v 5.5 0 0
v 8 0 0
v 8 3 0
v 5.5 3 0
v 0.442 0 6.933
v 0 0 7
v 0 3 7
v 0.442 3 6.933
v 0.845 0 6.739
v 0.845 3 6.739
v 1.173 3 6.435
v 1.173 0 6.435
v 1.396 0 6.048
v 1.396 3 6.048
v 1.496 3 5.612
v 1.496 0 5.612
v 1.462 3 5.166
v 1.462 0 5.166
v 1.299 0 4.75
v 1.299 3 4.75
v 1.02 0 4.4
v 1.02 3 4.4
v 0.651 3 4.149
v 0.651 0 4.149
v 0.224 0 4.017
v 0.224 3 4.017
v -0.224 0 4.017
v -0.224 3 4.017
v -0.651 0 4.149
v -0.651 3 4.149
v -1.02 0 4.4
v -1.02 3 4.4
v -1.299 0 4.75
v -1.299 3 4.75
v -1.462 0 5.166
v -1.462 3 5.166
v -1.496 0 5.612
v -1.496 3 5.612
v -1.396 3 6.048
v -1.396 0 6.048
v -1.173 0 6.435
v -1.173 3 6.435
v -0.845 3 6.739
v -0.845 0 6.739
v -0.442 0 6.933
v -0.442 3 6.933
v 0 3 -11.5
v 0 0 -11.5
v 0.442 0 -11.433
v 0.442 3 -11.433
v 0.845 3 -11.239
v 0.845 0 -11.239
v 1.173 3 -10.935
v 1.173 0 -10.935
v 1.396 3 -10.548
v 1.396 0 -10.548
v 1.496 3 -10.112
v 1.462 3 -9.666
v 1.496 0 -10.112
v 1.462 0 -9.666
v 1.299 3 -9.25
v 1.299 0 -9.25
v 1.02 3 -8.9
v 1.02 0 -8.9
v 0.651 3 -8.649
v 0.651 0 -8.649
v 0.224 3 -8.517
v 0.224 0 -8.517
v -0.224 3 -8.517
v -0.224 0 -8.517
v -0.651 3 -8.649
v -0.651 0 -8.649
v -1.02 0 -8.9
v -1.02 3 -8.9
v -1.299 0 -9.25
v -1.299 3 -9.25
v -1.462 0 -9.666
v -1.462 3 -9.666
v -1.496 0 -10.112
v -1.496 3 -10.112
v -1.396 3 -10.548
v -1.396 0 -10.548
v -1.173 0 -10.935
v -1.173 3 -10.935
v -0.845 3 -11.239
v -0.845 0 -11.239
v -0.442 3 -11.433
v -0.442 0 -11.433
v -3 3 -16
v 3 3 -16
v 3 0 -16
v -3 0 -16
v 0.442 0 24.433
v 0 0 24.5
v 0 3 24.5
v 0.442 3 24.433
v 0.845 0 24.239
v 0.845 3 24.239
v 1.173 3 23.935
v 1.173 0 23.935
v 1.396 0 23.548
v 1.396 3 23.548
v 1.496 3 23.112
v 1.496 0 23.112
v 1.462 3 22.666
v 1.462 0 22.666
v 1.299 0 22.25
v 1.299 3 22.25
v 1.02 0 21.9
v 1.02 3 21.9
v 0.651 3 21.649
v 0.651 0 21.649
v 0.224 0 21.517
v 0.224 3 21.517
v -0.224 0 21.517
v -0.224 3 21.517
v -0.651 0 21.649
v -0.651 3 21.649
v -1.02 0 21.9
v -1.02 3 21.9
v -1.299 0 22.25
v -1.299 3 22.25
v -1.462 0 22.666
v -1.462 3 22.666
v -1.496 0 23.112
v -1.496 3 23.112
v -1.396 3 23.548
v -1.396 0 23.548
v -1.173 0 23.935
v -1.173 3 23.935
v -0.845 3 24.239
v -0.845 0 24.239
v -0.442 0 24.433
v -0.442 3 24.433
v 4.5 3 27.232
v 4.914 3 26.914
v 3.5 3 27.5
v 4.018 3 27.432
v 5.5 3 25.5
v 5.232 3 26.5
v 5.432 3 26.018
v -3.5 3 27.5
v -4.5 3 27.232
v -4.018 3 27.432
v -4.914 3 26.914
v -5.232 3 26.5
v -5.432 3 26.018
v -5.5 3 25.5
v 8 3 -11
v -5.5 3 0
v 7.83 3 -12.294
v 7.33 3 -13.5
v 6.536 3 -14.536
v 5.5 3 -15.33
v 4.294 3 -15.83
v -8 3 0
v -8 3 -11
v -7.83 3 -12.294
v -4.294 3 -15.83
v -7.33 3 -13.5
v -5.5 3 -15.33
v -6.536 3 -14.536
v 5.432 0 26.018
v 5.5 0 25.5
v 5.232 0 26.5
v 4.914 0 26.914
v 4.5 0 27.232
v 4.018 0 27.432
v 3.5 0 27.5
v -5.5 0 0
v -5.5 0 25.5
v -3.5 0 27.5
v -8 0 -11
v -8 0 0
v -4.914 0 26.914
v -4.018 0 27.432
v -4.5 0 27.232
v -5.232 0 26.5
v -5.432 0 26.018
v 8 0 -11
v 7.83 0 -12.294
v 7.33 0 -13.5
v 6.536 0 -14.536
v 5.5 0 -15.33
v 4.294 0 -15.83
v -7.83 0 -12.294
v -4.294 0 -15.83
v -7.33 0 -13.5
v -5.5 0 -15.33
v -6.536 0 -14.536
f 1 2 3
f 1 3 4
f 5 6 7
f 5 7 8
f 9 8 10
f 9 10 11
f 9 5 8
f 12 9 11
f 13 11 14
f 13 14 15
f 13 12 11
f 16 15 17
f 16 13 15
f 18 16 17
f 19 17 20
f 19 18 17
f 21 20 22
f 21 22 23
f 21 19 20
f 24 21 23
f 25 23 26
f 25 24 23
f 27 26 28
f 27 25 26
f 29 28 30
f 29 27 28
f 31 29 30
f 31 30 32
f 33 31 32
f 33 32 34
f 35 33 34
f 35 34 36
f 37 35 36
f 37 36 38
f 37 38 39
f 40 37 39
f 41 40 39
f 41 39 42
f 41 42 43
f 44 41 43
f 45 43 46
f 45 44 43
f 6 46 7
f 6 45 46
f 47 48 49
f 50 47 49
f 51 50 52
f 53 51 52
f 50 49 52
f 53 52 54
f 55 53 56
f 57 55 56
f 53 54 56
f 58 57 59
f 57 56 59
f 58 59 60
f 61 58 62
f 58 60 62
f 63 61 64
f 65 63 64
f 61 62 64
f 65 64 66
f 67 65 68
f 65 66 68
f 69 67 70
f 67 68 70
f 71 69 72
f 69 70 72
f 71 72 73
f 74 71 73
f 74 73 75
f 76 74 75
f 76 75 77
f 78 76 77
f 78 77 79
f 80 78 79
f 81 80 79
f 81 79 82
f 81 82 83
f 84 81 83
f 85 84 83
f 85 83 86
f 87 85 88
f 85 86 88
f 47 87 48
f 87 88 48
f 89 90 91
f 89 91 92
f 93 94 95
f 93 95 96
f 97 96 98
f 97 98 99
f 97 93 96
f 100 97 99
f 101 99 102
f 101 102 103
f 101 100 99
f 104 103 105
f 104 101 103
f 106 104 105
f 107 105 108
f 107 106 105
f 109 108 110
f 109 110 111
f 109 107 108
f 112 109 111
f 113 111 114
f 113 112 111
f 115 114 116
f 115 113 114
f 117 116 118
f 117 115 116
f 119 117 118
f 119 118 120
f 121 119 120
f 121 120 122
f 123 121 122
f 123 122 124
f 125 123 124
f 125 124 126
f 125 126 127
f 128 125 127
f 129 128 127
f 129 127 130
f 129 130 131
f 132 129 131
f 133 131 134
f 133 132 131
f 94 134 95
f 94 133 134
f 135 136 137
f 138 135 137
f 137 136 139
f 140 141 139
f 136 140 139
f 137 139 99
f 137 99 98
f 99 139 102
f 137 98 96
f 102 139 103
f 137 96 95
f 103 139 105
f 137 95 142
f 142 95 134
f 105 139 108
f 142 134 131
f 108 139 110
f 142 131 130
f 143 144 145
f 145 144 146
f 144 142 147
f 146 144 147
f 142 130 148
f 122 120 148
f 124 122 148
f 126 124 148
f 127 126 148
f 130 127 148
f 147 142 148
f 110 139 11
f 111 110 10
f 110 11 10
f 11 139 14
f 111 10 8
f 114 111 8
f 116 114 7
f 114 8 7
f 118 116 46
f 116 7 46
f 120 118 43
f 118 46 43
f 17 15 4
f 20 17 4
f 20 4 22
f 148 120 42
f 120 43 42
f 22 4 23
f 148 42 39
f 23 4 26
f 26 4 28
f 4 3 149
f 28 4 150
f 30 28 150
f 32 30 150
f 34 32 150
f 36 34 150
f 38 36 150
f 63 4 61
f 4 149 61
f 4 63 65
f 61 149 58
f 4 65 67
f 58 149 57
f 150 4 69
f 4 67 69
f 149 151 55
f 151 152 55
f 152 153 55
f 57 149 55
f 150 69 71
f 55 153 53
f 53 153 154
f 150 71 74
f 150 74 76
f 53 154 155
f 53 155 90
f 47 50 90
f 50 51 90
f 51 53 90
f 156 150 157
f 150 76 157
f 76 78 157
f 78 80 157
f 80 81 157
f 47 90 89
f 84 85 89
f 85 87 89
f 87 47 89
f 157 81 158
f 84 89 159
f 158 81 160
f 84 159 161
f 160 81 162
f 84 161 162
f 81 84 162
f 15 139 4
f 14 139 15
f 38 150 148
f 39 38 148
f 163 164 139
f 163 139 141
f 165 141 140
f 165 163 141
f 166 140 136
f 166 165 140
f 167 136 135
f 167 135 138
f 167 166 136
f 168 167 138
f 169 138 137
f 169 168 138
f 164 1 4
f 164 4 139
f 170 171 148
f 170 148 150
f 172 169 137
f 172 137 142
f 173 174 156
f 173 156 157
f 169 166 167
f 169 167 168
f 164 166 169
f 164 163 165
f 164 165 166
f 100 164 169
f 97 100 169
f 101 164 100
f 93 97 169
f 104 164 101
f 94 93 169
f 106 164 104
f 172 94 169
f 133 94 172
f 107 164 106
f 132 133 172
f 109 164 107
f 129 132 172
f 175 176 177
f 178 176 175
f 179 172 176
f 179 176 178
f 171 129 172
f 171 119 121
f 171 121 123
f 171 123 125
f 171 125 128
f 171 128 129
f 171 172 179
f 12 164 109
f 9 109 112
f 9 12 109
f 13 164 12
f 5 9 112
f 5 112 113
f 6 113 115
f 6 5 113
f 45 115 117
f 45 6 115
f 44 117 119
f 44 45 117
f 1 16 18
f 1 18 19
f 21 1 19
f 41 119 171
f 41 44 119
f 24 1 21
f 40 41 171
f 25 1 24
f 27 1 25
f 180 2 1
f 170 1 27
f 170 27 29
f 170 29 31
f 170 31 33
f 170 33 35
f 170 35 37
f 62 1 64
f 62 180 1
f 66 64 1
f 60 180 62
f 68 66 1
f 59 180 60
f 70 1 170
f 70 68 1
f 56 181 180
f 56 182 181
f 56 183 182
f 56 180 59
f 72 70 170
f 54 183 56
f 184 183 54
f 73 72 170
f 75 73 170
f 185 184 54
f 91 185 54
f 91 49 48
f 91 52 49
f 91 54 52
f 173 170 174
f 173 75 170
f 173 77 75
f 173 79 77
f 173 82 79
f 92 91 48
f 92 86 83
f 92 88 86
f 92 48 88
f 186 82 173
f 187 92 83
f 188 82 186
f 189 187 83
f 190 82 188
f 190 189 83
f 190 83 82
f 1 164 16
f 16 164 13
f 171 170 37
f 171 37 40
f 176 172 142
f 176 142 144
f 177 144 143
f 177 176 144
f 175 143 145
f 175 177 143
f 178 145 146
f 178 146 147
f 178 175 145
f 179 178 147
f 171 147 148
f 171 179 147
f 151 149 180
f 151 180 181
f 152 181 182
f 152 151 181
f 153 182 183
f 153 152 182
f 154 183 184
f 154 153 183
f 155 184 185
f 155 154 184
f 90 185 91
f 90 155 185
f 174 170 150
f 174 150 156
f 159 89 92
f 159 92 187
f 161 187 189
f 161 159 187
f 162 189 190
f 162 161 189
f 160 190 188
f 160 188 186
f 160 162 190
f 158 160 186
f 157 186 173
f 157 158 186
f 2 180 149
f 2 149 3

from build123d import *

# Parameters (mm, degrees)
SKETCH3_R           = 1.5
BOSS_EXTRUDE1_DEPTH = 3
BOSS_EXTRUDE2_DEPTH = 3
SKETCH5_R           = 1.5
CUT_EXTRUDE1_DEPTH  = 3


with BuildPart() as part:
    # Sketch3 → Boss-Extrude1 (new body)
    # profile 1 of 2: a face of its own
    with BuildSketch(Plane(origin=(0, 0, 0), x_dir=(1, 0, 0), z_dir=(0, 1, 0))):
        with BuildLine():
            Line((-6, 5), (6, 5))
            ThreePointArc((6, 5), (7.414213562, 4.414213562), (8, 3))
            Line((8, 3), (8, 0))
            Line((8, 0), (-8, 0))
            Line((-8, 0), (-8, 3))
            ThreePointArc((-8, 3), (-7.414213562, 4.414213562), (-6, 5))
        make_face()
    # profile 2 of 2: a face of its own
    with BuildSketch(Plane(origin=(0, 0, 0), x_dir=(1, 0, 0), z_dir=(0, 1, 0))):
        with BuildLine():
            Line((-5.5, 0), (5.5, 0))
            Line((5.5, 0), (5.5, -25.5))
            ThreePointArc((5.5, -25.5), (4.914213562, -26.914213562), (3.5, -27.5))
            Line((3.5, -27.5), (-3.5, -27.5))
            ThreePointArc((-3.5, -27.5), (-4.914213562, -26.914213562), (-5.5, -25.5))
            Line((-5.5, -25.5), (-5.5, 0))
        make_face()
        with Locations(Location((0, -5.5, 0), (0, 0, 270))):
            Circle(SKETCH3_R, mode=Mode.SUBTRACT)
        with Locations(Location((0, -23, 0), (0, 0, 270))):
            Circle(SKETCH3_R, mode=Mode.SUBTRACT)
    extrude(amount=BOSS_EXTRUDE1_DEPTH)

    # Sketch4 → Boss-Extrude2 (add)
    with BuildSketch(Plane(origin=(0, 3, 0), x_dir=(1, 0, 0), z_dir=(0, 1, 0))):
        with BuildLine():
            Line((-8, 0), (8, 0))
            Line((8, 0), (8, 11))
            ThreePointArc((8, 11), (6.535533906, 14.535533906), (3, 16))
            Line((3, 16), (-3, 16))
            ThreePointArc((-3, 16), (-6.535533906, 14.535533906), (-8, 11))
            Line((-8, 11), (-8, 0))
        make_face()
    extrude(amount=-BOSS_EXTRUDE2_DEPTH)

    # Sketch5 → Cut-Extrude1 (cut)
    with BuildSketch(Plane(origin=(0, 0, 0), x_dir=(-1, 0, 0), z_dir=(0, -1, 0))):
        with Locations(Location((0, 10, 0), (0, 0, 90))):
            Circle(SKETCH5_R)
    extrude(amount=-CUT_EXTRUDE1_DEPTH, mode=Mode.SUBTRACT)


solid = part.part
